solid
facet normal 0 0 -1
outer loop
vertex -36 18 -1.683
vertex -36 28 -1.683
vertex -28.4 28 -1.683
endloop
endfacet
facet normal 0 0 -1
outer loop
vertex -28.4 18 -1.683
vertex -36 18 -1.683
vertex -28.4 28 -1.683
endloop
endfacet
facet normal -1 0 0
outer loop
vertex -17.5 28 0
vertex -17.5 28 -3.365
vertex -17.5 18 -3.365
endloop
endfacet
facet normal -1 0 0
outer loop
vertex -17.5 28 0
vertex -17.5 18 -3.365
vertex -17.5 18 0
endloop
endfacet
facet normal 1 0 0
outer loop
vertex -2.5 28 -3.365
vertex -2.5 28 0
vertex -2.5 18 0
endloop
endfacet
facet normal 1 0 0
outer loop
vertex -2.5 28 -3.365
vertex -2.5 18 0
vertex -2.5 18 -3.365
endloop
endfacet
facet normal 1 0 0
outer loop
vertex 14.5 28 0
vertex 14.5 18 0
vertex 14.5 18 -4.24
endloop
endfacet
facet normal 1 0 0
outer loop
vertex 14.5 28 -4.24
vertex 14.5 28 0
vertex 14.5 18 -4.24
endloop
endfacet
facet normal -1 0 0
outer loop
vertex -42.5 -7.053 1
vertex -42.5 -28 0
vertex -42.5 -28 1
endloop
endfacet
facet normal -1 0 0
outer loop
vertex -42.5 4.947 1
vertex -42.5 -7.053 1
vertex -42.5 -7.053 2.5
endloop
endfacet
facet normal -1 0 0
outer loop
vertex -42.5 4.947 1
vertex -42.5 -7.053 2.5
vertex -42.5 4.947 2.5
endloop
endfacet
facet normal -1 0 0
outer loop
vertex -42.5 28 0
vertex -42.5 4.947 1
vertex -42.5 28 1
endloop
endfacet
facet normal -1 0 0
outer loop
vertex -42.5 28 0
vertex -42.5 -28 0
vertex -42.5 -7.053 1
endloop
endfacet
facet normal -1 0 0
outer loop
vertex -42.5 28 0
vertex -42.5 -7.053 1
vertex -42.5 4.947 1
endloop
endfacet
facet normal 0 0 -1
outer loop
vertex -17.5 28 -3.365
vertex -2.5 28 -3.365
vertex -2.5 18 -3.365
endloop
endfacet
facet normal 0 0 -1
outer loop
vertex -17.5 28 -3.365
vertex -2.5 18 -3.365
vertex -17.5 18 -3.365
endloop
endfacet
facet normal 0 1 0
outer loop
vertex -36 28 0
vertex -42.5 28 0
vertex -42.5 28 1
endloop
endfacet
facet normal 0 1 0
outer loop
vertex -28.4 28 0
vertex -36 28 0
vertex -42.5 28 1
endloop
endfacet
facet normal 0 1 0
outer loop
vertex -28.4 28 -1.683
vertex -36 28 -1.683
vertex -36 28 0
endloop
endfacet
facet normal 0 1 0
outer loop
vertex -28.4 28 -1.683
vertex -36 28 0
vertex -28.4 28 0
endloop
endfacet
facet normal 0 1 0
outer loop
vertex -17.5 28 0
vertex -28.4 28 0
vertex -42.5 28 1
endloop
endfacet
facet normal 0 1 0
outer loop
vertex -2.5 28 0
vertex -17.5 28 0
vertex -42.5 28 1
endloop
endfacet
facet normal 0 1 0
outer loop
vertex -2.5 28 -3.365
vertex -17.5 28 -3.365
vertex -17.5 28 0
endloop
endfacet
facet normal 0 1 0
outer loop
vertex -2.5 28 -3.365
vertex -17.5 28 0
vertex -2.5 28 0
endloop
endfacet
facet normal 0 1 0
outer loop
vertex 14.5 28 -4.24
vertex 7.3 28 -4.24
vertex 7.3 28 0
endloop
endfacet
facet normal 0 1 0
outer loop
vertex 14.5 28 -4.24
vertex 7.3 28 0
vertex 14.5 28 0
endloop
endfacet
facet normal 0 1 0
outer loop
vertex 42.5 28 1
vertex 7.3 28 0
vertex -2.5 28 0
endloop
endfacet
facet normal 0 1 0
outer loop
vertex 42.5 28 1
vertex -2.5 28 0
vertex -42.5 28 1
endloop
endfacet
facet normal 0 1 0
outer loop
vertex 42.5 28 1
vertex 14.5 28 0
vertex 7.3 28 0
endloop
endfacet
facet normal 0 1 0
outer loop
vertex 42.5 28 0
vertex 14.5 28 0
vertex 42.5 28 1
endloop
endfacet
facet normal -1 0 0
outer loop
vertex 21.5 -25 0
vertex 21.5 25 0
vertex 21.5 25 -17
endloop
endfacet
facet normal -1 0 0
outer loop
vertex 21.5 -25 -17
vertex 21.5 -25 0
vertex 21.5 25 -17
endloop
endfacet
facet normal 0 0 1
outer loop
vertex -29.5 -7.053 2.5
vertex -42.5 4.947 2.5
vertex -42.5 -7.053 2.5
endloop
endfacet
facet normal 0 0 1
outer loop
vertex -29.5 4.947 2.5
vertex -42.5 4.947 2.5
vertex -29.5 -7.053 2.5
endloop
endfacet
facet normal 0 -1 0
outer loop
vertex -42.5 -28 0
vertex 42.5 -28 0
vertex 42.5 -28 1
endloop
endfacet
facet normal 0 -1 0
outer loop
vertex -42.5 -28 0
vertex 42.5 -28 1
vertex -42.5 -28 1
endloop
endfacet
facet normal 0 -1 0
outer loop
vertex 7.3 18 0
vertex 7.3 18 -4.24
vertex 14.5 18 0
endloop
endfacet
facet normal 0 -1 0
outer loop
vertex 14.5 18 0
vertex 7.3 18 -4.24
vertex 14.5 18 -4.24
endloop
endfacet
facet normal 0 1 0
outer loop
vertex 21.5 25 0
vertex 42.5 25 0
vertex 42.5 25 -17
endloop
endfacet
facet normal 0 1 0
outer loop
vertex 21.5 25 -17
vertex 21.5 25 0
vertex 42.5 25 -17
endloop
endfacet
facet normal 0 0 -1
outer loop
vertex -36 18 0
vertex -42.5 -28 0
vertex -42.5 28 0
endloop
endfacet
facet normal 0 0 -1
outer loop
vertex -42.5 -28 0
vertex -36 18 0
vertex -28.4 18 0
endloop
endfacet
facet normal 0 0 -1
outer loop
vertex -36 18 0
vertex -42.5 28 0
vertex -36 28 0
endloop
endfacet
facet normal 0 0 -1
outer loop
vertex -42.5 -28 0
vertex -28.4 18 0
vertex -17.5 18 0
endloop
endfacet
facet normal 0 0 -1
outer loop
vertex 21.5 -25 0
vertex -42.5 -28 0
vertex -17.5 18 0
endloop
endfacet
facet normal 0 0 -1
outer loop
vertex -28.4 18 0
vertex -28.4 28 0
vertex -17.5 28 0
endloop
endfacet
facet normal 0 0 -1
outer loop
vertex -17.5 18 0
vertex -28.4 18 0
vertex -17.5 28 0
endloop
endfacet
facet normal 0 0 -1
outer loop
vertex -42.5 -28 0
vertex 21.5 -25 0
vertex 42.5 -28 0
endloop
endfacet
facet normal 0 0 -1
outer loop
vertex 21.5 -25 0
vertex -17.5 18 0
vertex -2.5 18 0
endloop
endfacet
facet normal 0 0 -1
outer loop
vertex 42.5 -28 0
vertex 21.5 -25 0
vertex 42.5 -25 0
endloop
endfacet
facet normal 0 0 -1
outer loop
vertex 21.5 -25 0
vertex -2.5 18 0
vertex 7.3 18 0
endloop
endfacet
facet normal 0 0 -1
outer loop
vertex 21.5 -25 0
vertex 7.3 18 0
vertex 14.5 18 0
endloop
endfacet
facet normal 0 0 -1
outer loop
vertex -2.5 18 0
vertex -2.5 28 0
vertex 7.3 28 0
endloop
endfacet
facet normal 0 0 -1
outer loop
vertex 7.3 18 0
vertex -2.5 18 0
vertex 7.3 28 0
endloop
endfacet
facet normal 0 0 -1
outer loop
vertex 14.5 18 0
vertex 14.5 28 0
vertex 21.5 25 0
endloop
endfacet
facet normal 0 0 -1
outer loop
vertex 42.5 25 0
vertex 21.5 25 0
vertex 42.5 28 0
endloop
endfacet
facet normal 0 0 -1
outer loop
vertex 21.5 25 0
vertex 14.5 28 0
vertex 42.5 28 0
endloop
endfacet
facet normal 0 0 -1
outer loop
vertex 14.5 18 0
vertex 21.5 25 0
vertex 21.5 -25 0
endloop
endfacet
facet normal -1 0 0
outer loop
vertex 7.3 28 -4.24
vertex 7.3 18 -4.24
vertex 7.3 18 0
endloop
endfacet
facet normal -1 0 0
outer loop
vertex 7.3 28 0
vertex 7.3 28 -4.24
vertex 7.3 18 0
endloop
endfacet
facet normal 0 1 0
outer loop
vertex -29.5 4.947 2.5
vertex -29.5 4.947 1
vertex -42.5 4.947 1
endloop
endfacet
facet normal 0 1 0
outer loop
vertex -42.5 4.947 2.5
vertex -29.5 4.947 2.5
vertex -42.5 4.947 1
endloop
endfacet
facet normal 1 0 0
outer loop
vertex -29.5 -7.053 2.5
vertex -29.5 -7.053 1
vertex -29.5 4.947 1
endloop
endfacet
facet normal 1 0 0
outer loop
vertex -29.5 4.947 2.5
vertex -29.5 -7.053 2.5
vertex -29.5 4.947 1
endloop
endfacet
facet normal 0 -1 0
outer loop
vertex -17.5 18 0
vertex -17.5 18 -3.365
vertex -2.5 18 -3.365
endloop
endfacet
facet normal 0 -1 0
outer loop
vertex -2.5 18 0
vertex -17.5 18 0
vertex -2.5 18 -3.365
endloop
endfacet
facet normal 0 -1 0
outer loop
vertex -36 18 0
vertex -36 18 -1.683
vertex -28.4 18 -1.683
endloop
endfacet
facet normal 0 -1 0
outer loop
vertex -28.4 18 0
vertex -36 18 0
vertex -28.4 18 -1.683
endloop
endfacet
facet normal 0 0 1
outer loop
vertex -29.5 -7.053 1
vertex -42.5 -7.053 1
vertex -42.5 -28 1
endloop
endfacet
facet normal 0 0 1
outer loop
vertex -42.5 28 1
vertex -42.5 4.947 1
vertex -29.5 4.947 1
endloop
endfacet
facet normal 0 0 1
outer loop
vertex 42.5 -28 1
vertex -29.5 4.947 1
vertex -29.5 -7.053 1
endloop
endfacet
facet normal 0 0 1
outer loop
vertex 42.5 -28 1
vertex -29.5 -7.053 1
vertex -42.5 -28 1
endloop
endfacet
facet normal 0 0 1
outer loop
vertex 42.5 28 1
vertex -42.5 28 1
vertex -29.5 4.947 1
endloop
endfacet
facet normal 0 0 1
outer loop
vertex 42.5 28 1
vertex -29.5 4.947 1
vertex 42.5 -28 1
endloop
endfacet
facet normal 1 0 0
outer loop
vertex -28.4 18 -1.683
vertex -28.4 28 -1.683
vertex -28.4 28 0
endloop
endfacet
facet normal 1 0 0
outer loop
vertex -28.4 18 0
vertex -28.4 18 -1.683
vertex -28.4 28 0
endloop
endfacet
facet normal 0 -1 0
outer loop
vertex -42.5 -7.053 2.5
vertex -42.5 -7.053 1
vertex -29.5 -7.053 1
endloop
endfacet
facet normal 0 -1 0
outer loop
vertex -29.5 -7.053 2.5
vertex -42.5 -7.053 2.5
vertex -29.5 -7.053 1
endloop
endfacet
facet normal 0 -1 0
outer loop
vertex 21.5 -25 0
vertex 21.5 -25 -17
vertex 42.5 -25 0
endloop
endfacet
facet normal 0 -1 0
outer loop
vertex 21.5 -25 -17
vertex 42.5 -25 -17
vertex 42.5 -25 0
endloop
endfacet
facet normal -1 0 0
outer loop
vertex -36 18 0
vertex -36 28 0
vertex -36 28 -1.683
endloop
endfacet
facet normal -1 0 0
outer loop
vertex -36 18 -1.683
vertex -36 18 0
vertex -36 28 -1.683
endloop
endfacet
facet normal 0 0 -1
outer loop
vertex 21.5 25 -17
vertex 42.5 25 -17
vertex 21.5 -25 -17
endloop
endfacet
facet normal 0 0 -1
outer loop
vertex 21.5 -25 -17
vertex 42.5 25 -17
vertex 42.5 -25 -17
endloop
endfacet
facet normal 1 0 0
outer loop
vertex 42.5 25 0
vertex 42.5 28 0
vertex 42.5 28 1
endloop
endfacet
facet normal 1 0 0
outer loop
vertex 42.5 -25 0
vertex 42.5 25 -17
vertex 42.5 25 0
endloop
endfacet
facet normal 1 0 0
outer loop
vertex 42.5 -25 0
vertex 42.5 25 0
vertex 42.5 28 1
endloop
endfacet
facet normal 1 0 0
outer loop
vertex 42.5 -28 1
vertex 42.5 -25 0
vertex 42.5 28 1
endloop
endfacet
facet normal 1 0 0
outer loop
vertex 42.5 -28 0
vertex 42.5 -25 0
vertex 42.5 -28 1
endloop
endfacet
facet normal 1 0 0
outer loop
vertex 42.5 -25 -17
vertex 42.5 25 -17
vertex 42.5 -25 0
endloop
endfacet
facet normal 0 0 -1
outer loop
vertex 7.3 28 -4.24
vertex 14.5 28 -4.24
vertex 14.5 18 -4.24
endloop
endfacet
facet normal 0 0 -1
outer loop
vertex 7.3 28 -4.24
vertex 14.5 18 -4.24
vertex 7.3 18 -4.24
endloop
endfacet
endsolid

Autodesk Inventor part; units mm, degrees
ref_plane "YZ Plane" through (0, 0, 0) normal (1, 0, 0) x (0, 1, 0)
ref_plane "XZ Plane" through (0, 0, 0) normal (0, 1, 0) x (-1, 0, 0)
ref_plane "XY Plane" through (0, 0, 0) normal (0, 0, 1) x (1, 0, 0)
sketch "Sketch1" plane through (0, 0, 0) normal (0, 0, 1) x (1, 0, 0)
  line L0 (42.5, -28) -> (-42.5, -28)
  line L1 (-42.5, -28) -> (-42.5, 28)
  line L2 (-42.5, 28) -> (42.5, 28)
  line L3 (42.5, 28) -> (42.5, -28)
  line L4 (42.5, -28) -> (-42.5, 28) construction
  line L5 (-42.5, -28) -> (42.5, 28) construction
  point P0 (0, 0)
  dimension "d0" = 85
  dimension "d1" = 56
extrude "Extrusion1" add sketch "Sketch1" along normal blind 1
sketch "Sketch2" plane through (42.5, -28, 0) normal (1, 0, 0) x (0, 0, -1)
  line L0 (0, 56) -> (0, 0) projected
  line L1 (0, 53) -> (17, 53)
  line L2 (17, 53) -> (17, 3)
  line L3 (17, 3) -> (0, 3)
  line L4 (0, 3) -> (0, 53)
  line L5 (0, 56) -> (-1, 56) projected
  line L6 (0, 0) -> (-1, 0) projected
  point P0 (0, 28)
  dimension "d4" = 3
  dimension "d5" = 3
  dimension "d6" = 17
extrude "Extrusion2" add sketch "Sketch2" against normal blind 21
sketch "Sketch3" plane through (-42.5, 28, 0) normal (0, 1, 0) x (1, 0, 0)
  line L0 (49.8, 0) -> (57, 0)
  line L1 (57, 0) -> (57, 4.2398)
  line L2 (57, 4.2398) -> (49.8, 4.2398)
  line L3 (49.8, 4.2398) -> (49.8, 0)
  line L4 (25, 0) -> (40, 0)
  line L5 (40, 0) -> (40, 3.3654)
  line L6 (40, 3.3654) -> (25, 3.3654)
  line L7 (25, 3.3654) -> (25, 0)
  line L8 (6.5, 1.6827) -> (14.1, 1.6827)
  line L9 (14.1, 1.6827) -> (14.1, 0)
  line L10 (14.1, 0) -> (6.5, 0)
  line L11 (6.5, 0) -> (6.5, 1.6827)
  line L12 (85, 0) -> (85, -1) projected
  line L13 (0, 0) -> (0, -1) projected
  point P0 (42.5, 0)
  dimension "d9" = 28
  dimension "d10" = 7.2
  dimension "d11" = 6.5
  dimension "d12" = 7.6
  dimension "d13" = 15
  dimension "d14" = 25
extrude "Extrusion3" add sketch "Sketch3" against normal blind 10
sketch "Sketch4" plane through (0, 0, 1) normal (0, 0, 1) x (1, 0, 0)
  line L0 (-42.5, -7.0526) -> (-29.5, -7.0526)
  line L1 (-29.5, -7.0526) -> (-29.5, 4.9474)
  line L2 (-29.5, 4.9474) -> (-42.5, 4.9474)
  line L3 (-42.5, 4.9474) -> (-42.5, -7.0526)
  line L4 (-42.5, 28) -> (-42.5, -28) projected
  point P0 (0, 0)
  dimension "d17" = 12
  dimension "d18" = 13
extrude "Extrusion4" add sketch "Sketch4" along normal blind 1.5
properties part number "Raspi"
